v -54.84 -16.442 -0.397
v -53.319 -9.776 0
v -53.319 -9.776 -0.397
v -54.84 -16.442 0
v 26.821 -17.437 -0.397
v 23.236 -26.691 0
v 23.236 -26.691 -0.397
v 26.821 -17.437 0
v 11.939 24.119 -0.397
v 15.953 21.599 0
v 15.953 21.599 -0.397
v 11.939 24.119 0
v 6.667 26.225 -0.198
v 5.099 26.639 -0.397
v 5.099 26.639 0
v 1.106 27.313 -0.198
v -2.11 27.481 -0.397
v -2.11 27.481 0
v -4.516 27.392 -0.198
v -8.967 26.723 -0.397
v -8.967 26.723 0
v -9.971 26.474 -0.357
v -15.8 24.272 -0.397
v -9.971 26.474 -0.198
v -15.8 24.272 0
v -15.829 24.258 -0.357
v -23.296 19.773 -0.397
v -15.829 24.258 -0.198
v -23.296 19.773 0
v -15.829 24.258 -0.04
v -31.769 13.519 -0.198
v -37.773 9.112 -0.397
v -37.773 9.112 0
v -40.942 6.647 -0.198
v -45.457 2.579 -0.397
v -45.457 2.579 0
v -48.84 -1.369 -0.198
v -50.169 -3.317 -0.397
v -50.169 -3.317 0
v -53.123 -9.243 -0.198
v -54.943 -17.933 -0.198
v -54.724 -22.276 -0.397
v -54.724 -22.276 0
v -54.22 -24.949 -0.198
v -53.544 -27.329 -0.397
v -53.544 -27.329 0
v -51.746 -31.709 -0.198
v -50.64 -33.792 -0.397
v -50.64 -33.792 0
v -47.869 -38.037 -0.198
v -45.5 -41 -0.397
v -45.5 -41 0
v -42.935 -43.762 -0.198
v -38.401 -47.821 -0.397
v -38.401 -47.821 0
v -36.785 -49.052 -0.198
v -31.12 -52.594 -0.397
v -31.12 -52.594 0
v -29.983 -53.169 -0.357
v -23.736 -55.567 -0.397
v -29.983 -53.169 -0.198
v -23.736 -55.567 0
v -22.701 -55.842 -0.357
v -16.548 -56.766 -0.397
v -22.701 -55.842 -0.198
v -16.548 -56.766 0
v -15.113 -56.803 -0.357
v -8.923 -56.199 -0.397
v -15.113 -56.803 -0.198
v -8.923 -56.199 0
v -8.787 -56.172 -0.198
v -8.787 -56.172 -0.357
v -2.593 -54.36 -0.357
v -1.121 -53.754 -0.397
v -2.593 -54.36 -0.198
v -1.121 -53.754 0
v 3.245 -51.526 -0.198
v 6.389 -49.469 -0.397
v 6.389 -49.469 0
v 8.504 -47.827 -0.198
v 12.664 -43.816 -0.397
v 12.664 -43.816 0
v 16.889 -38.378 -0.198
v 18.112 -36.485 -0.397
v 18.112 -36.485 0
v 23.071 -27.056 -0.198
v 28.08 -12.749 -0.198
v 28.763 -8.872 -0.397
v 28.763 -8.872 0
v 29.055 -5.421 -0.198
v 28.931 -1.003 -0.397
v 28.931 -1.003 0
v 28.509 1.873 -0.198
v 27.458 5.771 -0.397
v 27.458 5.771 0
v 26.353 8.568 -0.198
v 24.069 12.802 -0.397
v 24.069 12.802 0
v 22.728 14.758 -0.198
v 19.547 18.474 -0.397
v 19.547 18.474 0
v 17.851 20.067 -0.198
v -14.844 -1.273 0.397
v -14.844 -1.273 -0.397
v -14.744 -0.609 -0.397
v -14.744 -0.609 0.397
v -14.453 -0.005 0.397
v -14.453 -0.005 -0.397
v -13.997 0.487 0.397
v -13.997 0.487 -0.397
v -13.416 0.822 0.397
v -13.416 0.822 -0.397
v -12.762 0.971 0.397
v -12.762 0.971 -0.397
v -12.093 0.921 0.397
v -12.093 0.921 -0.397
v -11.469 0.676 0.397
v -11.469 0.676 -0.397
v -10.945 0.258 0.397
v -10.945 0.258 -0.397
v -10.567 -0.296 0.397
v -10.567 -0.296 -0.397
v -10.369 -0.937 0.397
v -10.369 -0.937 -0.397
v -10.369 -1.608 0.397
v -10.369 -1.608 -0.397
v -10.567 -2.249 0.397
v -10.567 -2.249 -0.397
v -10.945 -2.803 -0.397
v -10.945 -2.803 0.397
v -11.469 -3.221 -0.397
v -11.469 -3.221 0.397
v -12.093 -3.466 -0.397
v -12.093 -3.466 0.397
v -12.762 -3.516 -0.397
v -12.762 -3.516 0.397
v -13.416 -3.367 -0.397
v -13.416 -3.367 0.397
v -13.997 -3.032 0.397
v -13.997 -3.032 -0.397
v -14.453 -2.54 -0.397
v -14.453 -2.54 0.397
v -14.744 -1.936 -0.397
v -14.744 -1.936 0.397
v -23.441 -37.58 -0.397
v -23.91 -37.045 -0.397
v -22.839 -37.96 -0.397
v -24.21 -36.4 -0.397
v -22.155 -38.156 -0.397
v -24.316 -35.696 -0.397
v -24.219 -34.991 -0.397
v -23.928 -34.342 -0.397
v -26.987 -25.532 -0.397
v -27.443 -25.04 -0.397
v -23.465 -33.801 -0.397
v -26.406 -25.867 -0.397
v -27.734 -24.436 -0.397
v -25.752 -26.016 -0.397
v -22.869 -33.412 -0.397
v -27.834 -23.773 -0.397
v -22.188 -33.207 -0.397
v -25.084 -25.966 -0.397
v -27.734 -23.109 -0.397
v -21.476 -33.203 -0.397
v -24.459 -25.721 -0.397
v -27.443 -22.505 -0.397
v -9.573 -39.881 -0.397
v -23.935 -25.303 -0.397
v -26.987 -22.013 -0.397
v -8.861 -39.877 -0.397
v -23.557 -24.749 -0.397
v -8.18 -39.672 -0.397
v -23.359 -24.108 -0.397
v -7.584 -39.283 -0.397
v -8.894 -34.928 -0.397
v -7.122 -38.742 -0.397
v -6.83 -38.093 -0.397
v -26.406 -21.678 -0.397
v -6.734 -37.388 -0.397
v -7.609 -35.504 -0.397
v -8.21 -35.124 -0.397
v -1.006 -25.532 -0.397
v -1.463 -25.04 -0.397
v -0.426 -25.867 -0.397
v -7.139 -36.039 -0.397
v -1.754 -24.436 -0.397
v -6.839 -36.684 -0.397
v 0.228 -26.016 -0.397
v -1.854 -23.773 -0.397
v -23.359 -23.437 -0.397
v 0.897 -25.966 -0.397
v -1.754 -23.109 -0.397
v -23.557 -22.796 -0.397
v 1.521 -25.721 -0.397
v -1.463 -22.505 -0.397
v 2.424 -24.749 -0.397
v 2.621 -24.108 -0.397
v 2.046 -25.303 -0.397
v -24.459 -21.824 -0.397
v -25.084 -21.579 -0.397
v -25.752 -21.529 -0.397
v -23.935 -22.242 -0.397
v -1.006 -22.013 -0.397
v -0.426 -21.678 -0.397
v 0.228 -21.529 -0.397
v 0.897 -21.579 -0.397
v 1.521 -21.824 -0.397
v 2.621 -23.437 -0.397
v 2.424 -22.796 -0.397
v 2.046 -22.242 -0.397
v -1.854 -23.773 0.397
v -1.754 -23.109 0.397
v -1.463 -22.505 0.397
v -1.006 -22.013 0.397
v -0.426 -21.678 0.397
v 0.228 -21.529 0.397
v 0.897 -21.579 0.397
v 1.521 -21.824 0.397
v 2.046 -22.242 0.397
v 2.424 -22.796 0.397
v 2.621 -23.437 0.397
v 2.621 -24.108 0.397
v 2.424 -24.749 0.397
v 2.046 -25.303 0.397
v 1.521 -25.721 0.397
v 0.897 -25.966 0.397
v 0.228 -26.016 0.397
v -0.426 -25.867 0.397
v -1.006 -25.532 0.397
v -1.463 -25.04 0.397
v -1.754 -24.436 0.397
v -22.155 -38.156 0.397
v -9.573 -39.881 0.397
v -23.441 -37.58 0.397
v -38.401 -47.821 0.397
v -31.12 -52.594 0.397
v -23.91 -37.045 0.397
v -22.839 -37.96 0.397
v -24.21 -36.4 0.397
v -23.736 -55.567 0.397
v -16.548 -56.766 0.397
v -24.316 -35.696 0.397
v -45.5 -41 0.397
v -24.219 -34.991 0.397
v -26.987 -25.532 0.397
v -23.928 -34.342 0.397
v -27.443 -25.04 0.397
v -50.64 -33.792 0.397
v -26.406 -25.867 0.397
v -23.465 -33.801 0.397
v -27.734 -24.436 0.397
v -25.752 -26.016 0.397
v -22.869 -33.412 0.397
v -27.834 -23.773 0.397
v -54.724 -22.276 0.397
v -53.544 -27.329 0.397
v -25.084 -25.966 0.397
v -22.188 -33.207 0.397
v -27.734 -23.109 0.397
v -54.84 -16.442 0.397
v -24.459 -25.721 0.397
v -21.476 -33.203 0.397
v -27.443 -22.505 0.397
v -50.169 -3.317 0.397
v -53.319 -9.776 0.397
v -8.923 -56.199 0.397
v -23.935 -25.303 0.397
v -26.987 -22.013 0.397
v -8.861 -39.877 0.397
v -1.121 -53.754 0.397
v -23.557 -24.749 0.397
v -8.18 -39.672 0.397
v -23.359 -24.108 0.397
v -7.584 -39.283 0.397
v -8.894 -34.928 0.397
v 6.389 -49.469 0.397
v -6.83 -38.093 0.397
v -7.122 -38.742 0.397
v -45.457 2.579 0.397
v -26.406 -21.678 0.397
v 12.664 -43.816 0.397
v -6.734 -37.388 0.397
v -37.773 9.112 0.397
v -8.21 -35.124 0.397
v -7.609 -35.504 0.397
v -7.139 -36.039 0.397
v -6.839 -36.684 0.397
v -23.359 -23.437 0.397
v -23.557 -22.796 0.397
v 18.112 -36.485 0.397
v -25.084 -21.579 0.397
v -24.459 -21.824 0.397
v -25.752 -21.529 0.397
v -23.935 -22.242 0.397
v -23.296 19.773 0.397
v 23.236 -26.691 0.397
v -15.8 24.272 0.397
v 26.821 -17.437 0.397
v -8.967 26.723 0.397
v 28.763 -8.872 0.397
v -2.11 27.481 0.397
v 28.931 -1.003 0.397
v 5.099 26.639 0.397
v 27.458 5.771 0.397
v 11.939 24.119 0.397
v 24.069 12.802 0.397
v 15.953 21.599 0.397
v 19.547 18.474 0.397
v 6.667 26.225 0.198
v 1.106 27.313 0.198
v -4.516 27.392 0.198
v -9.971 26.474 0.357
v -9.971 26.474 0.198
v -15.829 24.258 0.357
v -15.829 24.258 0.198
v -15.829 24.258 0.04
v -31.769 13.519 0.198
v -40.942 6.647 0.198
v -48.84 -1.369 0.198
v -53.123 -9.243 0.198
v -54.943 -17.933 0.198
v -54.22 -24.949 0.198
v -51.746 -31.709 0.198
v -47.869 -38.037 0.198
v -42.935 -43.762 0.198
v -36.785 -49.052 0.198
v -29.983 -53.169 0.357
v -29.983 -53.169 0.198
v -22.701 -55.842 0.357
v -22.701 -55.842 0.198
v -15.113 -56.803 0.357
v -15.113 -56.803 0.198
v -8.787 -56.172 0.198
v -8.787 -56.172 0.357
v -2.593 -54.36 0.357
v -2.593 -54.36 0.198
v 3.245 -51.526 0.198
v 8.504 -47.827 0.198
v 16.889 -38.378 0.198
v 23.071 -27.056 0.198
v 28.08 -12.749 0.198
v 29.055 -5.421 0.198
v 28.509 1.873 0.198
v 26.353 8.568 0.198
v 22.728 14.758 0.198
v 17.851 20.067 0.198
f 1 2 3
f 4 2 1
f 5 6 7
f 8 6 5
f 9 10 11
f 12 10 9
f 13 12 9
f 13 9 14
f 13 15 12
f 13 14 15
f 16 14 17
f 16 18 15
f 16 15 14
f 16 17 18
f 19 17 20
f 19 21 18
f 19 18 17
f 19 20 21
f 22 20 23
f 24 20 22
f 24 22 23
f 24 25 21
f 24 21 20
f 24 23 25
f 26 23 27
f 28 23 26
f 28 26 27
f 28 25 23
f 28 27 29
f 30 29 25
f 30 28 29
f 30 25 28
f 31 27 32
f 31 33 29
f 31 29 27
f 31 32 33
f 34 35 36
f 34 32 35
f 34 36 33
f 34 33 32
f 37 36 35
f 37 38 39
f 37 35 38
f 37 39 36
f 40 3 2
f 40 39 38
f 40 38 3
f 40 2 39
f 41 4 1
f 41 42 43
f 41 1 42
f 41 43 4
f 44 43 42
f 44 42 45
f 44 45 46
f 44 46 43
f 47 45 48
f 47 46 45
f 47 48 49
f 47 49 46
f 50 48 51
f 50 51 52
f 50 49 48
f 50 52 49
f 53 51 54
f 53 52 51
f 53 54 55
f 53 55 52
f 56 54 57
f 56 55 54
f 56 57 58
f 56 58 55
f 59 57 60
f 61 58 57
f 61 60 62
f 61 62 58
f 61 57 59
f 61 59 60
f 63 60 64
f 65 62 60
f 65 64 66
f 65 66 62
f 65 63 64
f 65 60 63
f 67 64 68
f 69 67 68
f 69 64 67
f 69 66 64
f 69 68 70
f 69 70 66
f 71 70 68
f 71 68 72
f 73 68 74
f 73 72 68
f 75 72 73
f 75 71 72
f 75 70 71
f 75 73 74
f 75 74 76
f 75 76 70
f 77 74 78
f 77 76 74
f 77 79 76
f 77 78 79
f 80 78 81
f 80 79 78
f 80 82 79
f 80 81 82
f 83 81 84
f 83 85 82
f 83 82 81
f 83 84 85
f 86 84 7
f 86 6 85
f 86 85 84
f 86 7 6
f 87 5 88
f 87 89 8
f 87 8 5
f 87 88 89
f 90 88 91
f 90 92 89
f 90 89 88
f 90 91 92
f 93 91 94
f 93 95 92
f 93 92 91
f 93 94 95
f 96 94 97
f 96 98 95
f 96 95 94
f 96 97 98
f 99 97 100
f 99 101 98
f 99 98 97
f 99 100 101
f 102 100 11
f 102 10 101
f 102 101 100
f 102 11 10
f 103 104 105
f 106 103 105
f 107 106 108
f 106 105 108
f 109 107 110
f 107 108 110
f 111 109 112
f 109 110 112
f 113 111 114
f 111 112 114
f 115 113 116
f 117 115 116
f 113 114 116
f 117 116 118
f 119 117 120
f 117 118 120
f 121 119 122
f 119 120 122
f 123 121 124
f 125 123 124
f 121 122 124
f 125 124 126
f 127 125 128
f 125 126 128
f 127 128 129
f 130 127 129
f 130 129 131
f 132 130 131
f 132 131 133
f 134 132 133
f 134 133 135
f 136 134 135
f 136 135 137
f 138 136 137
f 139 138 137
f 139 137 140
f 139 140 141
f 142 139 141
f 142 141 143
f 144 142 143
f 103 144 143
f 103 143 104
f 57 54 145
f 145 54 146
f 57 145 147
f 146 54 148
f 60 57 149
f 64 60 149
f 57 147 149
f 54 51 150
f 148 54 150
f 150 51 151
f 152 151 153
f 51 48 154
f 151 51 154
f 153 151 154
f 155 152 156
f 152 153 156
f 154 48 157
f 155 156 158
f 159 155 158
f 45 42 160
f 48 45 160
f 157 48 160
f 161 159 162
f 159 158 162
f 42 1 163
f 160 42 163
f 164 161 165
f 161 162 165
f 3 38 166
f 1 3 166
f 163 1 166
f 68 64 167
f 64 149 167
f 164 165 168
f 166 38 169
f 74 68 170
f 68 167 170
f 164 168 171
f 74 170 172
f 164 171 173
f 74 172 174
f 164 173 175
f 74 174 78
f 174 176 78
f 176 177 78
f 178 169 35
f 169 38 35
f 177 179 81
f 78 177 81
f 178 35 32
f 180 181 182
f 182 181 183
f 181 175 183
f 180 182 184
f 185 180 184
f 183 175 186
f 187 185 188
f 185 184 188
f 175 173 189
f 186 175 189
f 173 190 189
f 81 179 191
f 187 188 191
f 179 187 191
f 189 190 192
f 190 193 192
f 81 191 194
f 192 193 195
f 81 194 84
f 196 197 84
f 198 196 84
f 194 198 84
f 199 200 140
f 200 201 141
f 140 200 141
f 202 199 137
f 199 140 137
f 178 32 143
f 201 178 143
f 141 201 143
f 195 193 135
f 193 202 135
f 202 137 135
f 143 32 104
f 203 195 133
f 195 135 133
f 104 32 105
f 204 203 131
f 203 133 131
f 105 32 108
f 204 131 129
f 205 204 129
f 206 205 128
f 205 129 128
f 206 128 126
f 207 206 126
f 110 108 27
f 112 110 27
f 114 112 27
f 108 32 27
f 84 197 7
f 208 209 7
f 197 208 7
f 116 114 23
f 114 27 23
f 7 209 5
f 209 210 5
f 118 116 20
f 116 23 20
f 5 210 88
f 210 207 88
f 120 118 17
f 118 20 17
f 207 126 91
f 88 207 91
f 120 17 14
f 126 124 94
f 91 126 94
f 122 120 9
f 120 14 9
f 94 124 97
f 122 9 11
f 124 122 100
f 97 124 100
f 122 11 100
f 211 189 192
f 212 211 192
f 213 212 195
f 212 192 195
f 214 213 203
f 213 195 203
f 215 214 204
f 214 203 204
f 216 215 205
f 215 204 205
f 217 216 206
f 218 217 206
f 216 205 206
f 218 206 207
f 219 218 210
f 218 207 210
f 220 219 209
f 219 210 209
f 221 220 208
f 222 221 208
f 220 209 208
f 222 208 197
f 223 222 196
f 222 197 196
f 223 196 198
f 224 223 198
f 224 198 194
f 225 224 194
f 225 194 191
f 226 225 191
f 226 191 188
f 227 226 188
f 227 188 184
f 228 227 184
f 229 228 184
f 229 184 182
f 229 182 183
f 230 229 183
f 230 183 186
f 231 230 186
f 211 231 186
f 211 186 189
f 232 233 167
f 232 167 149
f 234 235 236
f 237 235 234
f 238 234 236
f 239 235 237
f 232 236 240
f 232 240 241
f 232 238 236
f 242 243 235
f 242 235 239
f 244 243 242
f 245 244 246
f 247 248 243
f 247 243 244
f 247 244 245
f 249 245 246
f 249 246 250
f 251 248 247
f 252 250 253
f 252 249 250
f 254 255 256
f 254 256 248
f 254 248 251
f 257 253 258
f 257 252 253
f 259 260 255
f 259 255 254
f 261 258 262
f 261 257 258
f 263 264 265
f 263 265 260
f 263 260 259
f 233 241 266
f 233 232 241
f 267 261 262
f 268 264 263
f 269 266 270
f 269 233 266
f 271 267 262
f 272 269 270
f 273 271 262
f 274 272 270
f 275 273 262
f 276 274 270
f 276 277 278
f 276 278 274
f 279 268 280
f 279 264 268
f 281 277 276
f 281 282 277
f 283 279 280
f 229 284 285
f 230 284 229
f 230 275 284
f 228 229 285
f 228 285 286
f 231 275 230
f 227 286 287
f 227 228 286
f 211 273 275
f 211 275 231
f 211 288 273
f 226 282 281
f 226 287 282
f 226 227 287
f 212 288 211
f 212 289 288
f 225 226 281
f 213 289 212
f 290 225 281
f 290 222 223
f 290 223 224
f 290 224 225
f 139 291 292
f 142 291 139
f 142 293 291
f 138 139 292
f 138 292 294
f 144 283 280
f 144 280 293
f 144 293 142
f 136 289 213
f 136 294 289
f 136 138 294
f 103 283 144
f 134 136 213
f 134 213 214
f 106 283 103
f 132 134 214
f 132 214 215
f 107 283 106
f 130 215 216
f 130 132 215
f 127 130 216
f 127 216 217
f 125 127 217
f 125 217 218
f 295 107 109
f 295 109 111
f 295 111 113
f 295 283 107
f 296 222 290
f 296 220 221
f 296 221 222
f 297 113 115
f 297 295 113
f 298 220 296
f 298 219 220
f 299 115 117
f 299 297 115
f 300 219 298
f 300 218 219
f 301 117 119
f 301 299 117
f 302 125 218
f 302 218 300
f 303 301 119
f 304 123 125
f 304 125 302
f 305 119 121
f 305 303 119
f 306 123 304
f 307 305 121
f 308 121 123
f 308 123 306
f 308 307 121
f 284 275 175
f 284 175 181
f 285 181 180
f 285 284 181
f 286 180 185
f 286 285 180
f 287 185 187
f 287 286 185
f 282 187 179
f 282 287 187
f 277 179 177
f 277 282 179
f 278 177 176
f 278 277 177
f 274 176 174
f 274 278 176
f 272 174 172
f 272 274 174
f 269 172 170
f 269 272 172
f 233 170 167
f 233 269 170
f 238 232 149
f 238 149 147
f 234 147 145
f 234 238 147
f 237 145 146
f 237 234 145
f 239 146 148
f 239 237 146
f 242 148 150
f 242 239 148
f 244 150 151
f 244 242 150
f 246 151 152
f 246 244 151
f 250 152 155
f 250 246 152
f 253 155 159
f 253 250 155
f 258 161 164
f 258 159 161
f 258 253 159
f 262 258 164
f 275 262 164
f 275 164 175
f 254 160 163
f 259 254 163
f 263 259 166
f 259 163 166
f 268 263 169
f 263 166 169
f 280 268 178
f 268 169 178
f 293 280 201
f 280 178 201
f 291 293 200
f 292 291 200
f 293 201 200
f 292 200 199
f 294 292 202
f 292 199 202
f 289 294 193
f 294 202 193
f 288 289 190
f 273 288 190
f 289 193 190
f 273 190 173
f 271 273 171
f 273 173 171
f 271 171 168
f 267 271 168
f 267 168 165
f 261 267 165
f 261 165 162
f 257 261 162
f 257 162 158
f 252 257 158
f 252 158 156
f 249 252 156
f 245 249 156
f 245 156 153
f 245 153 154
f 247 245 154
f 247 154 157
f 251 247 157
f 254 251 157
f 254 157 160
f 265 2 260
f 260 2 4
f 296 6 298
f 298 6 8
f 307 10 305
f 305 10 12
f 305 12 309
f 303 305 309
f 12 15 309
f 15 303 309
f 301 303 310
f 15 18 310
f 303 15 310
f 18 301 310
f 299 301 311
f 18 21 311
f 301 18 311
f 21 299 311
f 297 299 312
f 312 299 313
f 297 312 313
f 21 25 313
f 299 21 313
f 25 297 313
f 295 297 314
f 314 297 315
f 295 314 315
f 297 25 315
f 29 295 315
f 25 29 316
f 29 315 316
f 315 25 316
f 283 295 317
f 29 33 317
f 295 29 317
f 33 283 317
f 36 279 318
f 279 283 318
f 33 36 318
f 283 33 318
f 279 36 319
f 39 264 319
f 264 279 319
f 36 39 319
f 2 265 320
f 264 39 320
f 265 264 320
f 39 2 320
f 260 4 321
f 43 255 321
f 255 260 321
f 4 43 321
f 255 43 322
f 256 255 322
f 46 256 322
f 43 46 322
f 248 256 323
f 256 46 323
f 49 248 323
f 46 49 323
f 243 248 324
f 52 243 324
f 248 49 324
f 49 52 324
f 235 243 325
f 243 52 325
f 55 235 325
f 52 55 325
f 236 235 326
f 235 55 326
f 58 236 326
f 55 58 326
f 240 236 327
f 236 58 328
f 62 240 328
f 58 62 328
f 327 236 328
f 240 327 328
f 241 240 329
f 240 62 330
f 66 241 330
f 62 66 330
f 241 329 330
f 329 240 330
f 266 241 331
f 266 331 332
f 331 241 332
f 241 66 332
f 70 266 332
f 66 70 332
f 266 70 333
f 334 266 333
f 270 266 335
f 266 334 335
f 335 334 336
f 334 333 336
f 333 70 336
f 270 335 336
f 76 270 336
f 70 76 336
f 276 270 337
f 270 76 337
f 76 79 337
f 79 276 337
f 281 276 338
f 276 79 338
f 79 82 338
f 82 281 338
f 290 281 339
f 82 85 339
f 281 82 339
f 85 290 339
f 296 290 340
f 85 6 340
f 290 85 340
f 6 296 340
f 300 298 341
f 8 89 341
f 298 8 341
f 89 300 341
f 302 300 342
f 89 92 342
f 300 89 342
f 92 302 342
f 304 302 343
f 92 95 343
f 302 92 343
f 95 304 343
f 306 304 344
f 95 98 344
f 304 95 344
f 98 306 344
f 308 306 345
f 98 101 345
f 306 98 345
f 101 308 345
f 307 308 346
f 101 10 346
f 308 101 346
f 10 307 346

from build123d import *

# Parameters (mm, degrees)
BOSS_EXTRUDE1_DEPTH     = 0.396875
M4_CLEARANCE_HOLE1_D    = 4.5
CUT_EXTRUDE1_DEPTH      = 1.0000001
CUT_EXTRUDE1_DEPTH_BACK = 1.7937501


with BuildPart() as part:
    # Sketch1 → Boss-Extrude1 (new body, symmetric)
    with BuildSketch(Plane.XY):
        with BuildLine():
            add(Edge.make_bspline(
                [(11.938662052, 24.118546546), (5.203644407, 27.612099202), (-12.247017435, 29.216761409), (-30.839497435, 13.610185149), (-49.30348402, 1.488634449), (-58.548601808, -21.664446949), (-44.411240616, -46.56150278), (-17.228511826, -61.144878254), (10.679925614, -49.692920857), (24.553698364, -26.479665335), (33.387137292, 1.683714683), (20.41654036, 19.720946445), (11.938662052, 24.118546546)],
                knots=[0, 0, 0, 0, 0.086512684, 0.186061085, 0.27498958, 0.344292202, 0.456117157, 0.576745766, 0.675937244, 0.775538108, 0.891099913, 1, 1, 1, 1], degree=3))
        make_face()
    extrude(amount=BOSS_EXTRUDE1_DEPTH, both=True)

    # M4 Clearance Hole1 (through all)
    with Locations(Plane.XY.offset(0.396875)):
        with Locations((-12.593900177, -1.272585975), (0.396480879, -23.772585975), (-25.584281234, -23.772585975)):
            Hole(M4_CLEARANCE_HOLE1_D / 2)

    # Sketch8 → Cut-Extrude1 (cut, two sides)
    with BuildSketch(Plane.XY.offset(0.396875)) as cut_extrude1_sk:
        with BuildLine():
            Line((-21.476274898, -33.202714717), (-8.89395292, -34.927583887))
            ThreePointArc((-8.89395292, -34.927583887), (-6.756659061, -37.743960097), (-9.573035271, -39.881253957))
            Line((-9.573035271, -39.881253957), (-22.155357248, -38.156384786))
            ThreePointArc((-22.155357248, -38.156384786), (-24.292651108, -35.340008576), (-21.476274898, -33.202714717))
        make_face()
    extrude(amount=CUT_EXTRUDE1_DEPTH, mode=Mode.SUBTRACT)
    extrude(cut_extrude1_sk.sketch, amount=-CUT_EXTRUDE1_DEPTH_BACK, mode=Mode.SUBTRACT)


solid = part.part
